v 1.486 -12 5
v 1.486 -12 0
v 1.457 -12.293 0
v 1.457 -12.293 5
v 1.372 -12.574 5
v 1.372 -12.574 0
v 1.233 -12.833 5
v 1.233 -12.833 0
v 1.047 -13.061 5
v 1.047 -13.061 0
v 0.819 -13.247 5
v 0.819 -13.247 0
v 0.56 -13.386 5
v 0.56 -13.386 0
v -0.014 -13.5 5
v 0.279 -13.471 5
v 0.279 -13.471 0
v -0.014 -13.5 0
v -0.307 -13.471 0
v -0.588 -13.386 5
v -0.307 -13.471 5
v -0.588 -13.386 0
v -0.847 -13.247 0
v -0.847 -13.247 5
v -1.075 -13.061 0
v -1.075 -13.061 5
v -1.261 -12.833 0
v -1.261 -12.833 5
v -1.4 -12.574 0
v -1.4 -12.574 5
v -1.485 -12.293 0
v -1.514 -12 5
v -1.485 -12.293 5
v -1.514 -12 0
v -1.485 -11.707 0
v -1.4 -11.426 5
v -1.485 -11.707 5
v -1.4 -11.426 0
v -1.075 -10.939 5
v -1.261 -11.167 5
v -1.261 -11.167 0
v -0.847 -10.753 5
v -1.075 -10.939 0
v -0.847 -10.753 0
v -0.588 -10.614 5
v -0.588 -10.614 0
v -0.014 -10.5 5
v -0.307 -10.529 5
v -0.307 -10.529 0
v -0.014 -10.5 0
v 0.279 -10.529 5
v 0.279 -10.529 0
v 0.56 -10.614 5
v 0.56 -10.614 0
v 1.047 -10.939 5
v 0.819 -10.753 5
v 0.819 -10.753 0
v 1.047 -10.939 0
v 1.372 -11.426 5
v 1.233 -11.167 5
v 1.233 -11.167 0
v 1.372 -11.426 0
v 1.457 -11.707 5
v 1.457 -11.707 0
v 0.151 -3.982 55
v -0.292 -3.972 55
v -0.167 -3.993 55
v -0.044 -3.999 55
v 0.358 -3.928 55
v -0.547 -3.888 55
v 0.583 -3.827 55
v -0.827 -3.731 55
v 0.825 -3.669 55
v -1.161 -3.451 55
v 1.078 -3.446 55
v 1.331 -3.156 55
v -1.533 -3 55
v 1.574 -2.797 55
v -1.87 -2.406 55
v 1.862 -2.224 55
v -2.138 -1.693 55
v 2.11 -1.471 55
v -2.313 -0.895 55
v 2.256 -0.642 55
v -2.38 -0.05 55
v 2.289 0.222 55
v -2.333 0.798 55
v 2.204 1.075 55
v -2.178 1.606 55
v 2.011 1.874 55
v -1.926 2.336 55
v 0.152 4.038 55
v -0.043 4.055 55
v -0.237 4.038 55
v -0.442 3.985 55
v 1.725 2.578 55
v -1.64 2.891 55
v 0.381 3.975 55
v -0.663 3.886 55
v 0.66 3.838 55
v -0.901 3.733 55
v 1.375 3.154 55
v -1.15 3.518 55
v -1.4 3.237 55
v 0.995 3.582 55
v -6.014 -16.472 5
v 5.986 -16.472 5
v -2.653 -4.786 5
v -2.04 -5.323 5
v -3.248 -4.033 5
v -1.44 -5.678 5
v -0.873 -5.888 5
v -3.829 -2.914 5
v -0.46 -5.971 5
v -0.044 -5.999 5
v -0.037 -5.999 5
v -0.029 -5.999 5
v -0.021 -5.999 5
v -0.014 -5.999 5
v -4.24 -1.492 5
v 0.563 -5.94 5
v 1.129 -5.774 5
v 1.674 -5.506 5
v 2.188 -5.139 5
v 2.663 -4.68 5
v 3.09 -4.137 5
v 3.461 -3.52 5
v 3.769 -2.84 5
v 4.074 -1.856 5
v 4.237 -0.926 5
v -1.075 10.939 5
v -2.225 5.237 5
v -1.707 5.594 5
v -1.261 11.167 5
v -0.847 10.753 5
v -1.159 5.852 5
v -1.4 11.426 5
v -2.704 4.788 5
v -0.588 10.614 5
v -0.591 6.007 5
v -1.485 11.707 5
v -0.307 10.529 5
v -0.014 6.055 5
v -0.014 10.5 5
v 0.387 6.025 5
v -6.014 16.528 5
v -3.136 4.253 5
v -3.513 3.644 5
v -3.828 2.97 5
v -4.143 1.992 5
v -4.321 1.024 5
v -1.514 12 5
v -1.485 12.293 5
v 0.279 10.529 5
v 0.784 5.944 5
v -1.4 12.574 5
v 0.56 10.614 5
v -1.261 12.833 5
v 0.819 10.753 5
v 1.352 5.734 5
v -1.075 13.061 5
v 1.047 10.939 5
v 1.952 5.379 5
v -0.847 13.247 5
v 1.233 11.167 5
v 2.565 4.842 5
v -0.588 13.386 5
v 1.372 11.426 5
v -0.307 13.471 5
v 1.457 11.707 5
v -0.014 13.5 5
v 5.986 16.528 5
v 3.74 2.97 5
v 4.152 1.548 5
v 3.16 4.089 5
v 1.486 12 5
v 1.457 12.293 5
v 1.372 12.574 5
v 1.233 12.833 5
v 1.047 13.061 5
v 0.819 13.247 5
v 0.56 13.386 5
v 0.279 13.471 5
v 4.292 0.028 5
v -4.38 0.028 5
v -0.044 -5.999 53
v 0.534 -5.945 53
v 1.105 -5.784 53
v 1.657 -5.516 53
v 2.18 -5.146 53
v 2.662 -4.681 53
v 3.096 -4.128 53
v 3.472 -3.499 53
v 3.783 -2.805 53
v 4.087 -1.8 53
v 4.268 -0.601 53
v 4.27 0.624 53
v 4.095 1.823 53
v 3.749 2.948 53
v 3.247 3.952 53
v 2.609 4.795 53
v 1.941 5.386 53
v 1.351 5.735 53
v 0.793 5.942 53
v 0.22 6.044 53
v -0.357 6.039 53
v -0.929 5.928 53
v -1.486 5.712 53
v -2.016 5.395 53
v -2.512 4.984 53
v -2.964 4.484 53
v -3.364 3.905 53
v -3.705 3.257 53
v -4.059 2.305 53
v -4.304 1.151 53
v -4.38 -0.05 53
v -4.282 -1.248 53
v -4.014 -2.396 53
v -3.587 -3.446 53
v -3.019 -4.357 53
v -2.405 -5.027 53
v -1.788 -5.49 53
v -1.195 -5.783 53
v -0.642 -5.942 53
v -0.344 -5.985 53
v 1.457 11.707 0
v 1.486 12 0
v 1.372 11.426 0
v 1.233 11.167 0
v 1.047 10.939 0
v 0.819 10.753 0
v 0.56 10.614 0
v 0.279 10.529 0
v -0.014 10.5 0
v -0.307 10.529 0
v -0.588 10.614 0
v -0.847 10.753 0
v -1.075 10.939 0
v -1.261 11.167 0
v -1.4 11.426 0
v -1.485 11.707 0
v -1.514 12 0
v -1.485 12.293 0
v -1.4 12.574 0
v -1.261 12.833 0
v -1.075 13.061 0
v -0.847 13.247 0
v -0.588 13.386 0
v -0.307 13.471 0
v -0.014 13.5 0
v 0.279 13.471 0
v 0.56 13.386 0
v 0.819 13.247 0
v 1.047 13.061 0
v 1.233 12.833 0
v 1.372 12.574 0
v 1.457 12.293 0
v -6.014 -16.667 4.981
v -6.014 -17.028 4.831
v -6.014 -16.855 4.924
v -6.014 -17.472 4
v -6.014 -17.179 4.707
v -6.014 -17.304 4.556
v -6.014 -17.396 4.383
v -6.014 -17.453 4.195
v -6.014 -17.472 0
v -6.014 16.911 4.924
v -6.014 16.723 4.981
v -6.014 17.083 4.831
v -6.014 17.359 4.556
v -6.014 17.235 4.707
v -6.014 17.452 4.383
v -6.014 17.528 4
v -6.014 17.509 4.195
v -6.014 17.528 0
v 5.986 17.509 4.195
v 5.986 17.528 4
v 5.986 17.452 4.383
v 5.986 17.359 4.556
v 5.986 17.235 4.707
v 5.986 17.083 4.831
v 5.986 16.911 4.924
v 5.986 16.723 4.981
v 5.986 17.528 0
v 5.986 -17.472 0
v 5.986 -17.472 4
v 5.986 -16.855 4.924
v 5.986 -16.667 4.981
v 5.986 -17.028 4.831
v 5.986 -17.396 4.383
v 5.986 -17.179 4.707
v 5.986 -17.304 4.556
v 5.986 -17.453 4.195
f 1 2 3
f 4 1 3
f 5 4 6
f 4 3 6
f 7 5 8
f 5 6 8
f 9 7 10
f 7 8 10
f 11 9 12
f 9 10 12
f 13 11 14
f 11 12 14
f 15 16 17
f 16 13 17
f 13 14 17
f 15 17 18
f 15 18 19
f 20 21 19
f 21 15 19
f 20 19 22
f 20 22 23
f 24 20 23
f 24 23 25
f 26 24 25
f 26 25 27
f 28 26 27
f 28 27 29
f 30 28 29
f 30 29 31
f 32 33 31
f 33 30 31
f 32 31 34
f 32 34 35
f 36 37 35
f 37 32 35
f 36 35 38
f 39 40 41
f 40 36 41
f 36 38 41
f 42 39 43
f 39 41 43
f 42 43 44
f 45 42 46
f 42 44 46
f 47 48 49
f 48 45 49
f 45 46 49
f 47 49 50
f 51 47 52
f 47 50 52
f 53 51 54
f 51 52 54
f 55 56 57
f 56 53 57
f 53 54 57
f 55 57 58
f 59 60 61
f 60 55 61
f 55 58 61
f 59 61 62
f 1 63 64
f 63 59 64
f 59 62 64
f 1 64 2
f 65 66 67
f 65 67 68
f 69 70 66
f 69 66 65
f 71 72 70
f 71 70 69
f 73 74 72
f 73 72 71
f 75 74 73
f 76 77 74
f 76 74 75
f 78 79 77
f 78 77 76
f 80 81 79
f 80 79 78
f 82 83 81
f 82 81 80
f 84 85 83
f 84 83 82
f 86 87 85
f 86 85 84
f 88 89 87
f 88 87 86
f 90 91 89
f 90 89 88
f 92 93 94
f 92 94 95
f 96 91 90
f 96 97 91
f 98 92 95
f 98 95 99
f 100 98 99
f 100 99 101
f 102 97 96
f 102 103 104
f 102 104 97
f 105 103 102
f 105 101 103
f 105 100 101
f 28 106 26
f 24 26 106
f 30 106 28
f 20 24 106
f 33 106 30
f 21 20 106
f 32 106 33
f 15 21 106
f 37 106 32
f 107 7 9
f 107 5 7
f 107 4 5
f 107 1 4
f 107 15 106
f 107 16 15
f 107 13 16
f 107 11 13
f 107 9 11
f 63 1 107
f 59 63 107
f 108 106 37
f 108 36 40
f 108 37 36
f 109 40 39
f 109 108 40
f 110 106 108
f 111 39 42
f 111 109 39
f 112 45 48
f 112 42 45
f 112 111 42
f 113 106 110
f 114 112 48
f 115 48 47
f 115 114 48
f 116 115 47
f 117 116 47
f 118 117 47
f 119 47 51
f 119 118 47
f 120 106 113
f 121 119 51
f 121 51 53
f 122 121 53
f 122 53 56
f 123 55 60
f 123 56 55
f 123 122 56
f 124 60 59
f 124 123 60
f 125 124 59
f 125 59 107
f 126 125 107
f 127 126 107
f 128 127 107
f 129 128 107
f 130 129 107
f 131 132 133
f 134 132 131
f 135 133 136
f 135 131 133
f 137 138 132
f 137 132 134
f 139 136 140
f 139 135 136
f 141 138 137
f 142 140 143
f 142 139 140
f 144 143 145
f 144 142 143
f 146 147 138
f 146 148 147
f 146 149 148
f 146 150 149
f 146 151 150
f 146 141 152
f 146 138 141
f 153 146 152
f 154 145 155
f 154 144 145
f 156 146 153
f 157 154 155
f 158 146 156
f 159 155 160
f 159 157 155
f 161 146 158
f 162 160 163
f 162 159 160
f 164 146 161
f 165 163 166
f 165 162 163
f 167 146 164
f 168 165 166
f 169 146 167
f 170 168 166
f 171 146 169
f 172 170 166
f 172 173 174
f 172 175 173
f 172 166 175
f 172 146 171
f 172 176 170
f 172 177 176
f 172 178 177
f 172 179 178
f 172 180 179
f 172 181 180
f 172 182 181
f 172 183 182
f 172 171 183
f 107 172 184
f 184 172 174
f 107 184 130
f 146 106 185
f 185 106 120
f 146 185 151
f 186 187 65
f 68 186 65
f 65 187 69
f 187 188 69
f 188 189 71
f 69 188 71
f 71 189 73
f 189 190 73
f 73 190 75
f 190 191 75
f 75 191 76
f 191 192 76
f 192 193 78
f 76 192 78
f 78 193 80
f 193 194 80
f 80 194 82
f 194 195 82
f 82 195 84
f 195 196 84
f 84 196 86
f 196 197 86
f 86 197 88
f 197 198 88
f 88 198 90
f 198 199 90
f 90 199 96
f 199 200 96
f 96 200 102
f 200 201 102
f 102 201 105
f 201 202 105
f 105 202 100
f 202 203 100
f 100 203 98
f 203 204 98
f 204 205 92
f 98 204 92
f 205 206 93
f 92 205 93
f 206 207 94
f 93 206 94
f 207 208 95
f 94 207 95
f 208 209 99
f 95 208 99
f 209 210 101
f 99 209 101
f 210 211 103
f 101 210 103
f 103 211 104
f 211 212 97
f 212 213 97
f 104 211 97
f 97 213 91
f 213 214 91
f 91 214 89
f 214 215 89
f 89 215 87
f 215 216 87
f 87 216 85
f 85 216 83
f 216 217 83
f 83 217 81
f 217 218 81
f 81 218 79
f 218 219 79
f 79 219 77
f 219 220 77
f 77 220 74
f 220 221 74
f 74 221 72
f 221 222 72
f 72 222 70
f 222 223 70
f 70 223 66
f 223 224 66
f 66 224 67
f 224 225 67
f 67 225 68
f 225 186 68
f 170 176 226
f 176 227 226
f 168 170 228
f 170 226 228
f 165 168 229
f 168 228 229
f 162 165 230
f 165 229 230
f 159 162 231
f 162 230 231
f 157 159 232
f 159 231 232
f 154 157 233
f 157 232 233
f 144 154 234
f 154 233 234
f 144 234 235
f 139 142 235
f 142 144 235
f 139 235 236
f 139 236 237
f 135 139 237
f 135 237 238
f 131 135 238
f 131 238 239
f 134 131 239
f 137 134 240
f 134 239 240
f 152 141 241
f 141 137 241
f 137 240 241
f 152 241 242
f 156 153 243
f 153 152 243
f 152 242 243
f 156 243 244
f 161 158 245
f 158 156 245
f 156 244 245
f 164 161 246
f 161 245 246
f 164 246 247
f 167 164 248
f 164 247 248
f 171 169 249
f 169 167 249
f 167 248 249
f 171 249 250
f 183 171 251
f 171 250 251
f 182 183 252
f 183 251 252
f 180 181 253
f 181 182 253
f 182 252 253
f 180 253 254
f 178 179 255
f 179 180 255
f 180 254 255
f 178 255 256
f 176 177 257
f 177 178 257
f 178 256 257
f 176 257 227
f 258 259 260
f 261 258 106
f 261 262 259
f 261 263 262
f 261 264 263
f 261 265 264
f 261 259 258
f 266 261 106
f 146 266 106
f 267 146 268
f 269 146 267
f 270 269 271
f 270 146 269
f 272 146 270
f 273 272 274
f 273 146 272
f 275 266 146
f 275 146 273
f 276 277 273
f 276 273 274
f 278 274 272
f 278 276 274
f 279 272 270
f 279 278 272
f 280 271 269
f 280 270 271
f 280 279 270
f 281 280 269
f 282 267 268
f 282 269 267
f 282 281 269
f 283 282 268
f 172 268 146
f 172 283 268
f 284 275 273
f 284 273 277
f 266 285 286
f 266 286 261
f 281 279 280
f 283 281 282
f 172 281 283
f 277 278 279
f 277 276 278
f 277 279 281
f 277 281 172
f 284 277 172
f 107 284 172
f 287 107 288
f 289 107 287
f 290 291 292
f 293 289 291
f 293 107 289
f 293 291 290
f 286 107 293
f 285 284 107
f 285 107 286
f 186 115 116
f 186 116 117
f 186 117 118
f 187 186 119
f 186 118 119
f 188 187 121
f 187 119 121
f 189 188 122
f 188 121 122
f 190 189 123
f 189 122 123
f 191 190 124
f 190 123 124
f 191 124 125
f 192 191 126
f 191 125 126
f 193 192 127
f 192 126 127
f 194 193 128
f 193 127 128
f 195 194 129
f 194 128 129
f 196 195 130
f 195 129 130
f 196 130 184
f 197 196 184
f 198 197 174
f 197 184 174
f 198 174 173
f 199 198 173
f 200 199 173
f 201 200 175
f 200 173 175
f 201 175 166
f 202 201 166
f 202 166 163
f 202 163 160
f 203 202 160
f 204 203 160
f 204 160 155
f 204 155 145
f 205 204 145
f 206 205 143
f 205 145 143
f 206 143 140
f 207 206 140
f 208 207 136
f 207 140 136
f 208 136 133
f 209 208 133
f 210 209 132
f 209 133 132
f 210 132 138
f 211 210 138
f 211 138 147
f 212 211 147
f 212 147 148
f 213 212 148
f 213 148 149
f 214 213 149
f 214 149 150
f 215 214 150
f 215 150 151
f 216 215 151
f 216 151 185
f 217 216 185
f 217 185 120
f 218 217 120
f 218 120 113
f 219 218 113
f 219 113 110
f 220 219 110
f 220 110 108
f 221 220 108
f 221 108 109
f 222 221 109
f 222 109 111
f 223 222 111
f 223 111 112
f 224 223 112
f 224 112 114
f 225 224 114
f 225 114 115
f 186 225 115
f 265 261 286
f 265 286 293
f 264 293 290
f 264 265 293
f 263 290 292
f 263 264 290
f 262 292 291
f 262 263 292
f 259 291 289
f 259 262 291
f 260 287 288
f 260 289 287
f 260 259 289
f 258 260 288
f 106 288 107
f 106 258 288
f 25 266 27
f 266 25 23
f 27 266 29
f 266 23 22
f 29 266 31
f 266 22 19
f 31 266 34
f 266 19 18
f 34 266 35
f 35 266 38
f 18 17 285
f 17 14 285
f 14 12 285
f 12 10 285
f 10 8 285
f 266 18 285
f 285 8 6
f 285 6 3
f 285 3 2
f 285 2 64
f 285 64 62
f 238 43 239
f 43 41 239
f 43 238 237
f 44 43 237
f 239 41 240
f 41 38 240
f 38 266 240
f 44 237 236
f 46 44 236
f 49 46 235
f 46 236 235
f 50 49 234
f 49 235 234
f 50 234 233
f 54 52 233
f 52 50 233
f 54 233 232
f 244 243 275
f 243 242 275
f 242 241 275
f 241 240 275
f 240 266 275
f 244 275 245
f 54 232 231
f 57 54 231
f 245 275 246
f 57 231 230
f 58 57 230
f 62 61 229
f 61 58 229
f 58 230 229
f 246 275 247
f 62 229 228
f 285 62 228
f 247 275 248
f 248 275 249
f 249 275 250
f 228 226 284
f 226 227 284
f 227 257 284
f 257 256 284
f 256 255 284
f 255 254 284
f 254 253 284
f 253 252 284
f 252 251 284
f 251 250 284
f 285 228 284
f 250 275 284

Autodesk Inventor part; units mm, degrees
ref_plane "YZ Plane" through (0, 0, 0) normal (1, 0, 0) x (0, 1, 0)
ref_plane "XZ Plane" through (0, 0, 0) normal (0, 1, 0) x (-1, 0, 0)
ref_plane "XY Plane" through (0, 0, 0) normal (0, 0, 1) x (1, 0, 0)
sketch "Sketch1" plane through (0, 0, 0) normal (0, 0, 1) x (1, 0, 0)
  circle A0 centre (-0.0139, -12) radius 1.5
  circle A1 centre (-0.0139, 12) radius 1.5
  line L0 (-6.0139, 17.5279) -> (5.9861, 17.5279)
  line L1 (5.9861, 17.5279) -> (5.9861, -17.4721)
  line L2 (5.9861, -17.4721) -> (-6.0139, -17.4721)
  line L3 (-6.0139, -17.4721) -> (-6.0139, 17.5279)
  line L4 (-0.0139, 12) -> (-0.0139, -12)
  line L5 (-0.0139, 12) -> (-0.0139, 5.686)
  ellipse E0 centre (-0.0442, 0.0279) end of major axis (-0.0442, 6.0549) minor radius 4.3359
  point P0 (0, 0)
  point P1 (-0.0139, -12)
  point P2 (-0.0139, 17.5279)
  dimension "d0" = 0
  dimension "d12" = 24
  dimension "d13" = 12
extrude "Extrusion1" add sketch "Sketch1" along normal blind 5
sketch "Sketch2" plane through (0, 0, 5) normal (0, 0, 1) x (1, 0, 0)
  ellipse E0 centre (-0.0442, 0.0279) end of major axis (-0.0442, -5.9992) minor radius 4.3359 projected
  point P0 (0, 0)
extrude "Extrusion2" add sketch "Sketch2" along normal blind 50 and the other way blind 5
chamfer "Chamfer1" distance 2 angle 45 1 edges at (-0.0442, 6.0549, 55)
fillet "Fillet1" radius 1 1 edges at (-0.0139, 17.5279, 5)
fillet "Fillet2" radius 1 1 edges at (-0.0139, -17.4721, 5)
sketch "Sketch3" plane through (0, 0, 5) normal (0, 0, 1) x (1, 0, 0)
  point P0 (0, 0)
sketch "Sketch4" plane through (0, 0, 5) normal (0, 0, 1) x (1, 0, 0)
  point P0 (0, 0)
sketch "Sketch5" plane through (0, 0, 5) normal (0, 0, 1) x (1, 0, 0)
  point P0 (0, 0)
properties part number "apoioM-mod"
